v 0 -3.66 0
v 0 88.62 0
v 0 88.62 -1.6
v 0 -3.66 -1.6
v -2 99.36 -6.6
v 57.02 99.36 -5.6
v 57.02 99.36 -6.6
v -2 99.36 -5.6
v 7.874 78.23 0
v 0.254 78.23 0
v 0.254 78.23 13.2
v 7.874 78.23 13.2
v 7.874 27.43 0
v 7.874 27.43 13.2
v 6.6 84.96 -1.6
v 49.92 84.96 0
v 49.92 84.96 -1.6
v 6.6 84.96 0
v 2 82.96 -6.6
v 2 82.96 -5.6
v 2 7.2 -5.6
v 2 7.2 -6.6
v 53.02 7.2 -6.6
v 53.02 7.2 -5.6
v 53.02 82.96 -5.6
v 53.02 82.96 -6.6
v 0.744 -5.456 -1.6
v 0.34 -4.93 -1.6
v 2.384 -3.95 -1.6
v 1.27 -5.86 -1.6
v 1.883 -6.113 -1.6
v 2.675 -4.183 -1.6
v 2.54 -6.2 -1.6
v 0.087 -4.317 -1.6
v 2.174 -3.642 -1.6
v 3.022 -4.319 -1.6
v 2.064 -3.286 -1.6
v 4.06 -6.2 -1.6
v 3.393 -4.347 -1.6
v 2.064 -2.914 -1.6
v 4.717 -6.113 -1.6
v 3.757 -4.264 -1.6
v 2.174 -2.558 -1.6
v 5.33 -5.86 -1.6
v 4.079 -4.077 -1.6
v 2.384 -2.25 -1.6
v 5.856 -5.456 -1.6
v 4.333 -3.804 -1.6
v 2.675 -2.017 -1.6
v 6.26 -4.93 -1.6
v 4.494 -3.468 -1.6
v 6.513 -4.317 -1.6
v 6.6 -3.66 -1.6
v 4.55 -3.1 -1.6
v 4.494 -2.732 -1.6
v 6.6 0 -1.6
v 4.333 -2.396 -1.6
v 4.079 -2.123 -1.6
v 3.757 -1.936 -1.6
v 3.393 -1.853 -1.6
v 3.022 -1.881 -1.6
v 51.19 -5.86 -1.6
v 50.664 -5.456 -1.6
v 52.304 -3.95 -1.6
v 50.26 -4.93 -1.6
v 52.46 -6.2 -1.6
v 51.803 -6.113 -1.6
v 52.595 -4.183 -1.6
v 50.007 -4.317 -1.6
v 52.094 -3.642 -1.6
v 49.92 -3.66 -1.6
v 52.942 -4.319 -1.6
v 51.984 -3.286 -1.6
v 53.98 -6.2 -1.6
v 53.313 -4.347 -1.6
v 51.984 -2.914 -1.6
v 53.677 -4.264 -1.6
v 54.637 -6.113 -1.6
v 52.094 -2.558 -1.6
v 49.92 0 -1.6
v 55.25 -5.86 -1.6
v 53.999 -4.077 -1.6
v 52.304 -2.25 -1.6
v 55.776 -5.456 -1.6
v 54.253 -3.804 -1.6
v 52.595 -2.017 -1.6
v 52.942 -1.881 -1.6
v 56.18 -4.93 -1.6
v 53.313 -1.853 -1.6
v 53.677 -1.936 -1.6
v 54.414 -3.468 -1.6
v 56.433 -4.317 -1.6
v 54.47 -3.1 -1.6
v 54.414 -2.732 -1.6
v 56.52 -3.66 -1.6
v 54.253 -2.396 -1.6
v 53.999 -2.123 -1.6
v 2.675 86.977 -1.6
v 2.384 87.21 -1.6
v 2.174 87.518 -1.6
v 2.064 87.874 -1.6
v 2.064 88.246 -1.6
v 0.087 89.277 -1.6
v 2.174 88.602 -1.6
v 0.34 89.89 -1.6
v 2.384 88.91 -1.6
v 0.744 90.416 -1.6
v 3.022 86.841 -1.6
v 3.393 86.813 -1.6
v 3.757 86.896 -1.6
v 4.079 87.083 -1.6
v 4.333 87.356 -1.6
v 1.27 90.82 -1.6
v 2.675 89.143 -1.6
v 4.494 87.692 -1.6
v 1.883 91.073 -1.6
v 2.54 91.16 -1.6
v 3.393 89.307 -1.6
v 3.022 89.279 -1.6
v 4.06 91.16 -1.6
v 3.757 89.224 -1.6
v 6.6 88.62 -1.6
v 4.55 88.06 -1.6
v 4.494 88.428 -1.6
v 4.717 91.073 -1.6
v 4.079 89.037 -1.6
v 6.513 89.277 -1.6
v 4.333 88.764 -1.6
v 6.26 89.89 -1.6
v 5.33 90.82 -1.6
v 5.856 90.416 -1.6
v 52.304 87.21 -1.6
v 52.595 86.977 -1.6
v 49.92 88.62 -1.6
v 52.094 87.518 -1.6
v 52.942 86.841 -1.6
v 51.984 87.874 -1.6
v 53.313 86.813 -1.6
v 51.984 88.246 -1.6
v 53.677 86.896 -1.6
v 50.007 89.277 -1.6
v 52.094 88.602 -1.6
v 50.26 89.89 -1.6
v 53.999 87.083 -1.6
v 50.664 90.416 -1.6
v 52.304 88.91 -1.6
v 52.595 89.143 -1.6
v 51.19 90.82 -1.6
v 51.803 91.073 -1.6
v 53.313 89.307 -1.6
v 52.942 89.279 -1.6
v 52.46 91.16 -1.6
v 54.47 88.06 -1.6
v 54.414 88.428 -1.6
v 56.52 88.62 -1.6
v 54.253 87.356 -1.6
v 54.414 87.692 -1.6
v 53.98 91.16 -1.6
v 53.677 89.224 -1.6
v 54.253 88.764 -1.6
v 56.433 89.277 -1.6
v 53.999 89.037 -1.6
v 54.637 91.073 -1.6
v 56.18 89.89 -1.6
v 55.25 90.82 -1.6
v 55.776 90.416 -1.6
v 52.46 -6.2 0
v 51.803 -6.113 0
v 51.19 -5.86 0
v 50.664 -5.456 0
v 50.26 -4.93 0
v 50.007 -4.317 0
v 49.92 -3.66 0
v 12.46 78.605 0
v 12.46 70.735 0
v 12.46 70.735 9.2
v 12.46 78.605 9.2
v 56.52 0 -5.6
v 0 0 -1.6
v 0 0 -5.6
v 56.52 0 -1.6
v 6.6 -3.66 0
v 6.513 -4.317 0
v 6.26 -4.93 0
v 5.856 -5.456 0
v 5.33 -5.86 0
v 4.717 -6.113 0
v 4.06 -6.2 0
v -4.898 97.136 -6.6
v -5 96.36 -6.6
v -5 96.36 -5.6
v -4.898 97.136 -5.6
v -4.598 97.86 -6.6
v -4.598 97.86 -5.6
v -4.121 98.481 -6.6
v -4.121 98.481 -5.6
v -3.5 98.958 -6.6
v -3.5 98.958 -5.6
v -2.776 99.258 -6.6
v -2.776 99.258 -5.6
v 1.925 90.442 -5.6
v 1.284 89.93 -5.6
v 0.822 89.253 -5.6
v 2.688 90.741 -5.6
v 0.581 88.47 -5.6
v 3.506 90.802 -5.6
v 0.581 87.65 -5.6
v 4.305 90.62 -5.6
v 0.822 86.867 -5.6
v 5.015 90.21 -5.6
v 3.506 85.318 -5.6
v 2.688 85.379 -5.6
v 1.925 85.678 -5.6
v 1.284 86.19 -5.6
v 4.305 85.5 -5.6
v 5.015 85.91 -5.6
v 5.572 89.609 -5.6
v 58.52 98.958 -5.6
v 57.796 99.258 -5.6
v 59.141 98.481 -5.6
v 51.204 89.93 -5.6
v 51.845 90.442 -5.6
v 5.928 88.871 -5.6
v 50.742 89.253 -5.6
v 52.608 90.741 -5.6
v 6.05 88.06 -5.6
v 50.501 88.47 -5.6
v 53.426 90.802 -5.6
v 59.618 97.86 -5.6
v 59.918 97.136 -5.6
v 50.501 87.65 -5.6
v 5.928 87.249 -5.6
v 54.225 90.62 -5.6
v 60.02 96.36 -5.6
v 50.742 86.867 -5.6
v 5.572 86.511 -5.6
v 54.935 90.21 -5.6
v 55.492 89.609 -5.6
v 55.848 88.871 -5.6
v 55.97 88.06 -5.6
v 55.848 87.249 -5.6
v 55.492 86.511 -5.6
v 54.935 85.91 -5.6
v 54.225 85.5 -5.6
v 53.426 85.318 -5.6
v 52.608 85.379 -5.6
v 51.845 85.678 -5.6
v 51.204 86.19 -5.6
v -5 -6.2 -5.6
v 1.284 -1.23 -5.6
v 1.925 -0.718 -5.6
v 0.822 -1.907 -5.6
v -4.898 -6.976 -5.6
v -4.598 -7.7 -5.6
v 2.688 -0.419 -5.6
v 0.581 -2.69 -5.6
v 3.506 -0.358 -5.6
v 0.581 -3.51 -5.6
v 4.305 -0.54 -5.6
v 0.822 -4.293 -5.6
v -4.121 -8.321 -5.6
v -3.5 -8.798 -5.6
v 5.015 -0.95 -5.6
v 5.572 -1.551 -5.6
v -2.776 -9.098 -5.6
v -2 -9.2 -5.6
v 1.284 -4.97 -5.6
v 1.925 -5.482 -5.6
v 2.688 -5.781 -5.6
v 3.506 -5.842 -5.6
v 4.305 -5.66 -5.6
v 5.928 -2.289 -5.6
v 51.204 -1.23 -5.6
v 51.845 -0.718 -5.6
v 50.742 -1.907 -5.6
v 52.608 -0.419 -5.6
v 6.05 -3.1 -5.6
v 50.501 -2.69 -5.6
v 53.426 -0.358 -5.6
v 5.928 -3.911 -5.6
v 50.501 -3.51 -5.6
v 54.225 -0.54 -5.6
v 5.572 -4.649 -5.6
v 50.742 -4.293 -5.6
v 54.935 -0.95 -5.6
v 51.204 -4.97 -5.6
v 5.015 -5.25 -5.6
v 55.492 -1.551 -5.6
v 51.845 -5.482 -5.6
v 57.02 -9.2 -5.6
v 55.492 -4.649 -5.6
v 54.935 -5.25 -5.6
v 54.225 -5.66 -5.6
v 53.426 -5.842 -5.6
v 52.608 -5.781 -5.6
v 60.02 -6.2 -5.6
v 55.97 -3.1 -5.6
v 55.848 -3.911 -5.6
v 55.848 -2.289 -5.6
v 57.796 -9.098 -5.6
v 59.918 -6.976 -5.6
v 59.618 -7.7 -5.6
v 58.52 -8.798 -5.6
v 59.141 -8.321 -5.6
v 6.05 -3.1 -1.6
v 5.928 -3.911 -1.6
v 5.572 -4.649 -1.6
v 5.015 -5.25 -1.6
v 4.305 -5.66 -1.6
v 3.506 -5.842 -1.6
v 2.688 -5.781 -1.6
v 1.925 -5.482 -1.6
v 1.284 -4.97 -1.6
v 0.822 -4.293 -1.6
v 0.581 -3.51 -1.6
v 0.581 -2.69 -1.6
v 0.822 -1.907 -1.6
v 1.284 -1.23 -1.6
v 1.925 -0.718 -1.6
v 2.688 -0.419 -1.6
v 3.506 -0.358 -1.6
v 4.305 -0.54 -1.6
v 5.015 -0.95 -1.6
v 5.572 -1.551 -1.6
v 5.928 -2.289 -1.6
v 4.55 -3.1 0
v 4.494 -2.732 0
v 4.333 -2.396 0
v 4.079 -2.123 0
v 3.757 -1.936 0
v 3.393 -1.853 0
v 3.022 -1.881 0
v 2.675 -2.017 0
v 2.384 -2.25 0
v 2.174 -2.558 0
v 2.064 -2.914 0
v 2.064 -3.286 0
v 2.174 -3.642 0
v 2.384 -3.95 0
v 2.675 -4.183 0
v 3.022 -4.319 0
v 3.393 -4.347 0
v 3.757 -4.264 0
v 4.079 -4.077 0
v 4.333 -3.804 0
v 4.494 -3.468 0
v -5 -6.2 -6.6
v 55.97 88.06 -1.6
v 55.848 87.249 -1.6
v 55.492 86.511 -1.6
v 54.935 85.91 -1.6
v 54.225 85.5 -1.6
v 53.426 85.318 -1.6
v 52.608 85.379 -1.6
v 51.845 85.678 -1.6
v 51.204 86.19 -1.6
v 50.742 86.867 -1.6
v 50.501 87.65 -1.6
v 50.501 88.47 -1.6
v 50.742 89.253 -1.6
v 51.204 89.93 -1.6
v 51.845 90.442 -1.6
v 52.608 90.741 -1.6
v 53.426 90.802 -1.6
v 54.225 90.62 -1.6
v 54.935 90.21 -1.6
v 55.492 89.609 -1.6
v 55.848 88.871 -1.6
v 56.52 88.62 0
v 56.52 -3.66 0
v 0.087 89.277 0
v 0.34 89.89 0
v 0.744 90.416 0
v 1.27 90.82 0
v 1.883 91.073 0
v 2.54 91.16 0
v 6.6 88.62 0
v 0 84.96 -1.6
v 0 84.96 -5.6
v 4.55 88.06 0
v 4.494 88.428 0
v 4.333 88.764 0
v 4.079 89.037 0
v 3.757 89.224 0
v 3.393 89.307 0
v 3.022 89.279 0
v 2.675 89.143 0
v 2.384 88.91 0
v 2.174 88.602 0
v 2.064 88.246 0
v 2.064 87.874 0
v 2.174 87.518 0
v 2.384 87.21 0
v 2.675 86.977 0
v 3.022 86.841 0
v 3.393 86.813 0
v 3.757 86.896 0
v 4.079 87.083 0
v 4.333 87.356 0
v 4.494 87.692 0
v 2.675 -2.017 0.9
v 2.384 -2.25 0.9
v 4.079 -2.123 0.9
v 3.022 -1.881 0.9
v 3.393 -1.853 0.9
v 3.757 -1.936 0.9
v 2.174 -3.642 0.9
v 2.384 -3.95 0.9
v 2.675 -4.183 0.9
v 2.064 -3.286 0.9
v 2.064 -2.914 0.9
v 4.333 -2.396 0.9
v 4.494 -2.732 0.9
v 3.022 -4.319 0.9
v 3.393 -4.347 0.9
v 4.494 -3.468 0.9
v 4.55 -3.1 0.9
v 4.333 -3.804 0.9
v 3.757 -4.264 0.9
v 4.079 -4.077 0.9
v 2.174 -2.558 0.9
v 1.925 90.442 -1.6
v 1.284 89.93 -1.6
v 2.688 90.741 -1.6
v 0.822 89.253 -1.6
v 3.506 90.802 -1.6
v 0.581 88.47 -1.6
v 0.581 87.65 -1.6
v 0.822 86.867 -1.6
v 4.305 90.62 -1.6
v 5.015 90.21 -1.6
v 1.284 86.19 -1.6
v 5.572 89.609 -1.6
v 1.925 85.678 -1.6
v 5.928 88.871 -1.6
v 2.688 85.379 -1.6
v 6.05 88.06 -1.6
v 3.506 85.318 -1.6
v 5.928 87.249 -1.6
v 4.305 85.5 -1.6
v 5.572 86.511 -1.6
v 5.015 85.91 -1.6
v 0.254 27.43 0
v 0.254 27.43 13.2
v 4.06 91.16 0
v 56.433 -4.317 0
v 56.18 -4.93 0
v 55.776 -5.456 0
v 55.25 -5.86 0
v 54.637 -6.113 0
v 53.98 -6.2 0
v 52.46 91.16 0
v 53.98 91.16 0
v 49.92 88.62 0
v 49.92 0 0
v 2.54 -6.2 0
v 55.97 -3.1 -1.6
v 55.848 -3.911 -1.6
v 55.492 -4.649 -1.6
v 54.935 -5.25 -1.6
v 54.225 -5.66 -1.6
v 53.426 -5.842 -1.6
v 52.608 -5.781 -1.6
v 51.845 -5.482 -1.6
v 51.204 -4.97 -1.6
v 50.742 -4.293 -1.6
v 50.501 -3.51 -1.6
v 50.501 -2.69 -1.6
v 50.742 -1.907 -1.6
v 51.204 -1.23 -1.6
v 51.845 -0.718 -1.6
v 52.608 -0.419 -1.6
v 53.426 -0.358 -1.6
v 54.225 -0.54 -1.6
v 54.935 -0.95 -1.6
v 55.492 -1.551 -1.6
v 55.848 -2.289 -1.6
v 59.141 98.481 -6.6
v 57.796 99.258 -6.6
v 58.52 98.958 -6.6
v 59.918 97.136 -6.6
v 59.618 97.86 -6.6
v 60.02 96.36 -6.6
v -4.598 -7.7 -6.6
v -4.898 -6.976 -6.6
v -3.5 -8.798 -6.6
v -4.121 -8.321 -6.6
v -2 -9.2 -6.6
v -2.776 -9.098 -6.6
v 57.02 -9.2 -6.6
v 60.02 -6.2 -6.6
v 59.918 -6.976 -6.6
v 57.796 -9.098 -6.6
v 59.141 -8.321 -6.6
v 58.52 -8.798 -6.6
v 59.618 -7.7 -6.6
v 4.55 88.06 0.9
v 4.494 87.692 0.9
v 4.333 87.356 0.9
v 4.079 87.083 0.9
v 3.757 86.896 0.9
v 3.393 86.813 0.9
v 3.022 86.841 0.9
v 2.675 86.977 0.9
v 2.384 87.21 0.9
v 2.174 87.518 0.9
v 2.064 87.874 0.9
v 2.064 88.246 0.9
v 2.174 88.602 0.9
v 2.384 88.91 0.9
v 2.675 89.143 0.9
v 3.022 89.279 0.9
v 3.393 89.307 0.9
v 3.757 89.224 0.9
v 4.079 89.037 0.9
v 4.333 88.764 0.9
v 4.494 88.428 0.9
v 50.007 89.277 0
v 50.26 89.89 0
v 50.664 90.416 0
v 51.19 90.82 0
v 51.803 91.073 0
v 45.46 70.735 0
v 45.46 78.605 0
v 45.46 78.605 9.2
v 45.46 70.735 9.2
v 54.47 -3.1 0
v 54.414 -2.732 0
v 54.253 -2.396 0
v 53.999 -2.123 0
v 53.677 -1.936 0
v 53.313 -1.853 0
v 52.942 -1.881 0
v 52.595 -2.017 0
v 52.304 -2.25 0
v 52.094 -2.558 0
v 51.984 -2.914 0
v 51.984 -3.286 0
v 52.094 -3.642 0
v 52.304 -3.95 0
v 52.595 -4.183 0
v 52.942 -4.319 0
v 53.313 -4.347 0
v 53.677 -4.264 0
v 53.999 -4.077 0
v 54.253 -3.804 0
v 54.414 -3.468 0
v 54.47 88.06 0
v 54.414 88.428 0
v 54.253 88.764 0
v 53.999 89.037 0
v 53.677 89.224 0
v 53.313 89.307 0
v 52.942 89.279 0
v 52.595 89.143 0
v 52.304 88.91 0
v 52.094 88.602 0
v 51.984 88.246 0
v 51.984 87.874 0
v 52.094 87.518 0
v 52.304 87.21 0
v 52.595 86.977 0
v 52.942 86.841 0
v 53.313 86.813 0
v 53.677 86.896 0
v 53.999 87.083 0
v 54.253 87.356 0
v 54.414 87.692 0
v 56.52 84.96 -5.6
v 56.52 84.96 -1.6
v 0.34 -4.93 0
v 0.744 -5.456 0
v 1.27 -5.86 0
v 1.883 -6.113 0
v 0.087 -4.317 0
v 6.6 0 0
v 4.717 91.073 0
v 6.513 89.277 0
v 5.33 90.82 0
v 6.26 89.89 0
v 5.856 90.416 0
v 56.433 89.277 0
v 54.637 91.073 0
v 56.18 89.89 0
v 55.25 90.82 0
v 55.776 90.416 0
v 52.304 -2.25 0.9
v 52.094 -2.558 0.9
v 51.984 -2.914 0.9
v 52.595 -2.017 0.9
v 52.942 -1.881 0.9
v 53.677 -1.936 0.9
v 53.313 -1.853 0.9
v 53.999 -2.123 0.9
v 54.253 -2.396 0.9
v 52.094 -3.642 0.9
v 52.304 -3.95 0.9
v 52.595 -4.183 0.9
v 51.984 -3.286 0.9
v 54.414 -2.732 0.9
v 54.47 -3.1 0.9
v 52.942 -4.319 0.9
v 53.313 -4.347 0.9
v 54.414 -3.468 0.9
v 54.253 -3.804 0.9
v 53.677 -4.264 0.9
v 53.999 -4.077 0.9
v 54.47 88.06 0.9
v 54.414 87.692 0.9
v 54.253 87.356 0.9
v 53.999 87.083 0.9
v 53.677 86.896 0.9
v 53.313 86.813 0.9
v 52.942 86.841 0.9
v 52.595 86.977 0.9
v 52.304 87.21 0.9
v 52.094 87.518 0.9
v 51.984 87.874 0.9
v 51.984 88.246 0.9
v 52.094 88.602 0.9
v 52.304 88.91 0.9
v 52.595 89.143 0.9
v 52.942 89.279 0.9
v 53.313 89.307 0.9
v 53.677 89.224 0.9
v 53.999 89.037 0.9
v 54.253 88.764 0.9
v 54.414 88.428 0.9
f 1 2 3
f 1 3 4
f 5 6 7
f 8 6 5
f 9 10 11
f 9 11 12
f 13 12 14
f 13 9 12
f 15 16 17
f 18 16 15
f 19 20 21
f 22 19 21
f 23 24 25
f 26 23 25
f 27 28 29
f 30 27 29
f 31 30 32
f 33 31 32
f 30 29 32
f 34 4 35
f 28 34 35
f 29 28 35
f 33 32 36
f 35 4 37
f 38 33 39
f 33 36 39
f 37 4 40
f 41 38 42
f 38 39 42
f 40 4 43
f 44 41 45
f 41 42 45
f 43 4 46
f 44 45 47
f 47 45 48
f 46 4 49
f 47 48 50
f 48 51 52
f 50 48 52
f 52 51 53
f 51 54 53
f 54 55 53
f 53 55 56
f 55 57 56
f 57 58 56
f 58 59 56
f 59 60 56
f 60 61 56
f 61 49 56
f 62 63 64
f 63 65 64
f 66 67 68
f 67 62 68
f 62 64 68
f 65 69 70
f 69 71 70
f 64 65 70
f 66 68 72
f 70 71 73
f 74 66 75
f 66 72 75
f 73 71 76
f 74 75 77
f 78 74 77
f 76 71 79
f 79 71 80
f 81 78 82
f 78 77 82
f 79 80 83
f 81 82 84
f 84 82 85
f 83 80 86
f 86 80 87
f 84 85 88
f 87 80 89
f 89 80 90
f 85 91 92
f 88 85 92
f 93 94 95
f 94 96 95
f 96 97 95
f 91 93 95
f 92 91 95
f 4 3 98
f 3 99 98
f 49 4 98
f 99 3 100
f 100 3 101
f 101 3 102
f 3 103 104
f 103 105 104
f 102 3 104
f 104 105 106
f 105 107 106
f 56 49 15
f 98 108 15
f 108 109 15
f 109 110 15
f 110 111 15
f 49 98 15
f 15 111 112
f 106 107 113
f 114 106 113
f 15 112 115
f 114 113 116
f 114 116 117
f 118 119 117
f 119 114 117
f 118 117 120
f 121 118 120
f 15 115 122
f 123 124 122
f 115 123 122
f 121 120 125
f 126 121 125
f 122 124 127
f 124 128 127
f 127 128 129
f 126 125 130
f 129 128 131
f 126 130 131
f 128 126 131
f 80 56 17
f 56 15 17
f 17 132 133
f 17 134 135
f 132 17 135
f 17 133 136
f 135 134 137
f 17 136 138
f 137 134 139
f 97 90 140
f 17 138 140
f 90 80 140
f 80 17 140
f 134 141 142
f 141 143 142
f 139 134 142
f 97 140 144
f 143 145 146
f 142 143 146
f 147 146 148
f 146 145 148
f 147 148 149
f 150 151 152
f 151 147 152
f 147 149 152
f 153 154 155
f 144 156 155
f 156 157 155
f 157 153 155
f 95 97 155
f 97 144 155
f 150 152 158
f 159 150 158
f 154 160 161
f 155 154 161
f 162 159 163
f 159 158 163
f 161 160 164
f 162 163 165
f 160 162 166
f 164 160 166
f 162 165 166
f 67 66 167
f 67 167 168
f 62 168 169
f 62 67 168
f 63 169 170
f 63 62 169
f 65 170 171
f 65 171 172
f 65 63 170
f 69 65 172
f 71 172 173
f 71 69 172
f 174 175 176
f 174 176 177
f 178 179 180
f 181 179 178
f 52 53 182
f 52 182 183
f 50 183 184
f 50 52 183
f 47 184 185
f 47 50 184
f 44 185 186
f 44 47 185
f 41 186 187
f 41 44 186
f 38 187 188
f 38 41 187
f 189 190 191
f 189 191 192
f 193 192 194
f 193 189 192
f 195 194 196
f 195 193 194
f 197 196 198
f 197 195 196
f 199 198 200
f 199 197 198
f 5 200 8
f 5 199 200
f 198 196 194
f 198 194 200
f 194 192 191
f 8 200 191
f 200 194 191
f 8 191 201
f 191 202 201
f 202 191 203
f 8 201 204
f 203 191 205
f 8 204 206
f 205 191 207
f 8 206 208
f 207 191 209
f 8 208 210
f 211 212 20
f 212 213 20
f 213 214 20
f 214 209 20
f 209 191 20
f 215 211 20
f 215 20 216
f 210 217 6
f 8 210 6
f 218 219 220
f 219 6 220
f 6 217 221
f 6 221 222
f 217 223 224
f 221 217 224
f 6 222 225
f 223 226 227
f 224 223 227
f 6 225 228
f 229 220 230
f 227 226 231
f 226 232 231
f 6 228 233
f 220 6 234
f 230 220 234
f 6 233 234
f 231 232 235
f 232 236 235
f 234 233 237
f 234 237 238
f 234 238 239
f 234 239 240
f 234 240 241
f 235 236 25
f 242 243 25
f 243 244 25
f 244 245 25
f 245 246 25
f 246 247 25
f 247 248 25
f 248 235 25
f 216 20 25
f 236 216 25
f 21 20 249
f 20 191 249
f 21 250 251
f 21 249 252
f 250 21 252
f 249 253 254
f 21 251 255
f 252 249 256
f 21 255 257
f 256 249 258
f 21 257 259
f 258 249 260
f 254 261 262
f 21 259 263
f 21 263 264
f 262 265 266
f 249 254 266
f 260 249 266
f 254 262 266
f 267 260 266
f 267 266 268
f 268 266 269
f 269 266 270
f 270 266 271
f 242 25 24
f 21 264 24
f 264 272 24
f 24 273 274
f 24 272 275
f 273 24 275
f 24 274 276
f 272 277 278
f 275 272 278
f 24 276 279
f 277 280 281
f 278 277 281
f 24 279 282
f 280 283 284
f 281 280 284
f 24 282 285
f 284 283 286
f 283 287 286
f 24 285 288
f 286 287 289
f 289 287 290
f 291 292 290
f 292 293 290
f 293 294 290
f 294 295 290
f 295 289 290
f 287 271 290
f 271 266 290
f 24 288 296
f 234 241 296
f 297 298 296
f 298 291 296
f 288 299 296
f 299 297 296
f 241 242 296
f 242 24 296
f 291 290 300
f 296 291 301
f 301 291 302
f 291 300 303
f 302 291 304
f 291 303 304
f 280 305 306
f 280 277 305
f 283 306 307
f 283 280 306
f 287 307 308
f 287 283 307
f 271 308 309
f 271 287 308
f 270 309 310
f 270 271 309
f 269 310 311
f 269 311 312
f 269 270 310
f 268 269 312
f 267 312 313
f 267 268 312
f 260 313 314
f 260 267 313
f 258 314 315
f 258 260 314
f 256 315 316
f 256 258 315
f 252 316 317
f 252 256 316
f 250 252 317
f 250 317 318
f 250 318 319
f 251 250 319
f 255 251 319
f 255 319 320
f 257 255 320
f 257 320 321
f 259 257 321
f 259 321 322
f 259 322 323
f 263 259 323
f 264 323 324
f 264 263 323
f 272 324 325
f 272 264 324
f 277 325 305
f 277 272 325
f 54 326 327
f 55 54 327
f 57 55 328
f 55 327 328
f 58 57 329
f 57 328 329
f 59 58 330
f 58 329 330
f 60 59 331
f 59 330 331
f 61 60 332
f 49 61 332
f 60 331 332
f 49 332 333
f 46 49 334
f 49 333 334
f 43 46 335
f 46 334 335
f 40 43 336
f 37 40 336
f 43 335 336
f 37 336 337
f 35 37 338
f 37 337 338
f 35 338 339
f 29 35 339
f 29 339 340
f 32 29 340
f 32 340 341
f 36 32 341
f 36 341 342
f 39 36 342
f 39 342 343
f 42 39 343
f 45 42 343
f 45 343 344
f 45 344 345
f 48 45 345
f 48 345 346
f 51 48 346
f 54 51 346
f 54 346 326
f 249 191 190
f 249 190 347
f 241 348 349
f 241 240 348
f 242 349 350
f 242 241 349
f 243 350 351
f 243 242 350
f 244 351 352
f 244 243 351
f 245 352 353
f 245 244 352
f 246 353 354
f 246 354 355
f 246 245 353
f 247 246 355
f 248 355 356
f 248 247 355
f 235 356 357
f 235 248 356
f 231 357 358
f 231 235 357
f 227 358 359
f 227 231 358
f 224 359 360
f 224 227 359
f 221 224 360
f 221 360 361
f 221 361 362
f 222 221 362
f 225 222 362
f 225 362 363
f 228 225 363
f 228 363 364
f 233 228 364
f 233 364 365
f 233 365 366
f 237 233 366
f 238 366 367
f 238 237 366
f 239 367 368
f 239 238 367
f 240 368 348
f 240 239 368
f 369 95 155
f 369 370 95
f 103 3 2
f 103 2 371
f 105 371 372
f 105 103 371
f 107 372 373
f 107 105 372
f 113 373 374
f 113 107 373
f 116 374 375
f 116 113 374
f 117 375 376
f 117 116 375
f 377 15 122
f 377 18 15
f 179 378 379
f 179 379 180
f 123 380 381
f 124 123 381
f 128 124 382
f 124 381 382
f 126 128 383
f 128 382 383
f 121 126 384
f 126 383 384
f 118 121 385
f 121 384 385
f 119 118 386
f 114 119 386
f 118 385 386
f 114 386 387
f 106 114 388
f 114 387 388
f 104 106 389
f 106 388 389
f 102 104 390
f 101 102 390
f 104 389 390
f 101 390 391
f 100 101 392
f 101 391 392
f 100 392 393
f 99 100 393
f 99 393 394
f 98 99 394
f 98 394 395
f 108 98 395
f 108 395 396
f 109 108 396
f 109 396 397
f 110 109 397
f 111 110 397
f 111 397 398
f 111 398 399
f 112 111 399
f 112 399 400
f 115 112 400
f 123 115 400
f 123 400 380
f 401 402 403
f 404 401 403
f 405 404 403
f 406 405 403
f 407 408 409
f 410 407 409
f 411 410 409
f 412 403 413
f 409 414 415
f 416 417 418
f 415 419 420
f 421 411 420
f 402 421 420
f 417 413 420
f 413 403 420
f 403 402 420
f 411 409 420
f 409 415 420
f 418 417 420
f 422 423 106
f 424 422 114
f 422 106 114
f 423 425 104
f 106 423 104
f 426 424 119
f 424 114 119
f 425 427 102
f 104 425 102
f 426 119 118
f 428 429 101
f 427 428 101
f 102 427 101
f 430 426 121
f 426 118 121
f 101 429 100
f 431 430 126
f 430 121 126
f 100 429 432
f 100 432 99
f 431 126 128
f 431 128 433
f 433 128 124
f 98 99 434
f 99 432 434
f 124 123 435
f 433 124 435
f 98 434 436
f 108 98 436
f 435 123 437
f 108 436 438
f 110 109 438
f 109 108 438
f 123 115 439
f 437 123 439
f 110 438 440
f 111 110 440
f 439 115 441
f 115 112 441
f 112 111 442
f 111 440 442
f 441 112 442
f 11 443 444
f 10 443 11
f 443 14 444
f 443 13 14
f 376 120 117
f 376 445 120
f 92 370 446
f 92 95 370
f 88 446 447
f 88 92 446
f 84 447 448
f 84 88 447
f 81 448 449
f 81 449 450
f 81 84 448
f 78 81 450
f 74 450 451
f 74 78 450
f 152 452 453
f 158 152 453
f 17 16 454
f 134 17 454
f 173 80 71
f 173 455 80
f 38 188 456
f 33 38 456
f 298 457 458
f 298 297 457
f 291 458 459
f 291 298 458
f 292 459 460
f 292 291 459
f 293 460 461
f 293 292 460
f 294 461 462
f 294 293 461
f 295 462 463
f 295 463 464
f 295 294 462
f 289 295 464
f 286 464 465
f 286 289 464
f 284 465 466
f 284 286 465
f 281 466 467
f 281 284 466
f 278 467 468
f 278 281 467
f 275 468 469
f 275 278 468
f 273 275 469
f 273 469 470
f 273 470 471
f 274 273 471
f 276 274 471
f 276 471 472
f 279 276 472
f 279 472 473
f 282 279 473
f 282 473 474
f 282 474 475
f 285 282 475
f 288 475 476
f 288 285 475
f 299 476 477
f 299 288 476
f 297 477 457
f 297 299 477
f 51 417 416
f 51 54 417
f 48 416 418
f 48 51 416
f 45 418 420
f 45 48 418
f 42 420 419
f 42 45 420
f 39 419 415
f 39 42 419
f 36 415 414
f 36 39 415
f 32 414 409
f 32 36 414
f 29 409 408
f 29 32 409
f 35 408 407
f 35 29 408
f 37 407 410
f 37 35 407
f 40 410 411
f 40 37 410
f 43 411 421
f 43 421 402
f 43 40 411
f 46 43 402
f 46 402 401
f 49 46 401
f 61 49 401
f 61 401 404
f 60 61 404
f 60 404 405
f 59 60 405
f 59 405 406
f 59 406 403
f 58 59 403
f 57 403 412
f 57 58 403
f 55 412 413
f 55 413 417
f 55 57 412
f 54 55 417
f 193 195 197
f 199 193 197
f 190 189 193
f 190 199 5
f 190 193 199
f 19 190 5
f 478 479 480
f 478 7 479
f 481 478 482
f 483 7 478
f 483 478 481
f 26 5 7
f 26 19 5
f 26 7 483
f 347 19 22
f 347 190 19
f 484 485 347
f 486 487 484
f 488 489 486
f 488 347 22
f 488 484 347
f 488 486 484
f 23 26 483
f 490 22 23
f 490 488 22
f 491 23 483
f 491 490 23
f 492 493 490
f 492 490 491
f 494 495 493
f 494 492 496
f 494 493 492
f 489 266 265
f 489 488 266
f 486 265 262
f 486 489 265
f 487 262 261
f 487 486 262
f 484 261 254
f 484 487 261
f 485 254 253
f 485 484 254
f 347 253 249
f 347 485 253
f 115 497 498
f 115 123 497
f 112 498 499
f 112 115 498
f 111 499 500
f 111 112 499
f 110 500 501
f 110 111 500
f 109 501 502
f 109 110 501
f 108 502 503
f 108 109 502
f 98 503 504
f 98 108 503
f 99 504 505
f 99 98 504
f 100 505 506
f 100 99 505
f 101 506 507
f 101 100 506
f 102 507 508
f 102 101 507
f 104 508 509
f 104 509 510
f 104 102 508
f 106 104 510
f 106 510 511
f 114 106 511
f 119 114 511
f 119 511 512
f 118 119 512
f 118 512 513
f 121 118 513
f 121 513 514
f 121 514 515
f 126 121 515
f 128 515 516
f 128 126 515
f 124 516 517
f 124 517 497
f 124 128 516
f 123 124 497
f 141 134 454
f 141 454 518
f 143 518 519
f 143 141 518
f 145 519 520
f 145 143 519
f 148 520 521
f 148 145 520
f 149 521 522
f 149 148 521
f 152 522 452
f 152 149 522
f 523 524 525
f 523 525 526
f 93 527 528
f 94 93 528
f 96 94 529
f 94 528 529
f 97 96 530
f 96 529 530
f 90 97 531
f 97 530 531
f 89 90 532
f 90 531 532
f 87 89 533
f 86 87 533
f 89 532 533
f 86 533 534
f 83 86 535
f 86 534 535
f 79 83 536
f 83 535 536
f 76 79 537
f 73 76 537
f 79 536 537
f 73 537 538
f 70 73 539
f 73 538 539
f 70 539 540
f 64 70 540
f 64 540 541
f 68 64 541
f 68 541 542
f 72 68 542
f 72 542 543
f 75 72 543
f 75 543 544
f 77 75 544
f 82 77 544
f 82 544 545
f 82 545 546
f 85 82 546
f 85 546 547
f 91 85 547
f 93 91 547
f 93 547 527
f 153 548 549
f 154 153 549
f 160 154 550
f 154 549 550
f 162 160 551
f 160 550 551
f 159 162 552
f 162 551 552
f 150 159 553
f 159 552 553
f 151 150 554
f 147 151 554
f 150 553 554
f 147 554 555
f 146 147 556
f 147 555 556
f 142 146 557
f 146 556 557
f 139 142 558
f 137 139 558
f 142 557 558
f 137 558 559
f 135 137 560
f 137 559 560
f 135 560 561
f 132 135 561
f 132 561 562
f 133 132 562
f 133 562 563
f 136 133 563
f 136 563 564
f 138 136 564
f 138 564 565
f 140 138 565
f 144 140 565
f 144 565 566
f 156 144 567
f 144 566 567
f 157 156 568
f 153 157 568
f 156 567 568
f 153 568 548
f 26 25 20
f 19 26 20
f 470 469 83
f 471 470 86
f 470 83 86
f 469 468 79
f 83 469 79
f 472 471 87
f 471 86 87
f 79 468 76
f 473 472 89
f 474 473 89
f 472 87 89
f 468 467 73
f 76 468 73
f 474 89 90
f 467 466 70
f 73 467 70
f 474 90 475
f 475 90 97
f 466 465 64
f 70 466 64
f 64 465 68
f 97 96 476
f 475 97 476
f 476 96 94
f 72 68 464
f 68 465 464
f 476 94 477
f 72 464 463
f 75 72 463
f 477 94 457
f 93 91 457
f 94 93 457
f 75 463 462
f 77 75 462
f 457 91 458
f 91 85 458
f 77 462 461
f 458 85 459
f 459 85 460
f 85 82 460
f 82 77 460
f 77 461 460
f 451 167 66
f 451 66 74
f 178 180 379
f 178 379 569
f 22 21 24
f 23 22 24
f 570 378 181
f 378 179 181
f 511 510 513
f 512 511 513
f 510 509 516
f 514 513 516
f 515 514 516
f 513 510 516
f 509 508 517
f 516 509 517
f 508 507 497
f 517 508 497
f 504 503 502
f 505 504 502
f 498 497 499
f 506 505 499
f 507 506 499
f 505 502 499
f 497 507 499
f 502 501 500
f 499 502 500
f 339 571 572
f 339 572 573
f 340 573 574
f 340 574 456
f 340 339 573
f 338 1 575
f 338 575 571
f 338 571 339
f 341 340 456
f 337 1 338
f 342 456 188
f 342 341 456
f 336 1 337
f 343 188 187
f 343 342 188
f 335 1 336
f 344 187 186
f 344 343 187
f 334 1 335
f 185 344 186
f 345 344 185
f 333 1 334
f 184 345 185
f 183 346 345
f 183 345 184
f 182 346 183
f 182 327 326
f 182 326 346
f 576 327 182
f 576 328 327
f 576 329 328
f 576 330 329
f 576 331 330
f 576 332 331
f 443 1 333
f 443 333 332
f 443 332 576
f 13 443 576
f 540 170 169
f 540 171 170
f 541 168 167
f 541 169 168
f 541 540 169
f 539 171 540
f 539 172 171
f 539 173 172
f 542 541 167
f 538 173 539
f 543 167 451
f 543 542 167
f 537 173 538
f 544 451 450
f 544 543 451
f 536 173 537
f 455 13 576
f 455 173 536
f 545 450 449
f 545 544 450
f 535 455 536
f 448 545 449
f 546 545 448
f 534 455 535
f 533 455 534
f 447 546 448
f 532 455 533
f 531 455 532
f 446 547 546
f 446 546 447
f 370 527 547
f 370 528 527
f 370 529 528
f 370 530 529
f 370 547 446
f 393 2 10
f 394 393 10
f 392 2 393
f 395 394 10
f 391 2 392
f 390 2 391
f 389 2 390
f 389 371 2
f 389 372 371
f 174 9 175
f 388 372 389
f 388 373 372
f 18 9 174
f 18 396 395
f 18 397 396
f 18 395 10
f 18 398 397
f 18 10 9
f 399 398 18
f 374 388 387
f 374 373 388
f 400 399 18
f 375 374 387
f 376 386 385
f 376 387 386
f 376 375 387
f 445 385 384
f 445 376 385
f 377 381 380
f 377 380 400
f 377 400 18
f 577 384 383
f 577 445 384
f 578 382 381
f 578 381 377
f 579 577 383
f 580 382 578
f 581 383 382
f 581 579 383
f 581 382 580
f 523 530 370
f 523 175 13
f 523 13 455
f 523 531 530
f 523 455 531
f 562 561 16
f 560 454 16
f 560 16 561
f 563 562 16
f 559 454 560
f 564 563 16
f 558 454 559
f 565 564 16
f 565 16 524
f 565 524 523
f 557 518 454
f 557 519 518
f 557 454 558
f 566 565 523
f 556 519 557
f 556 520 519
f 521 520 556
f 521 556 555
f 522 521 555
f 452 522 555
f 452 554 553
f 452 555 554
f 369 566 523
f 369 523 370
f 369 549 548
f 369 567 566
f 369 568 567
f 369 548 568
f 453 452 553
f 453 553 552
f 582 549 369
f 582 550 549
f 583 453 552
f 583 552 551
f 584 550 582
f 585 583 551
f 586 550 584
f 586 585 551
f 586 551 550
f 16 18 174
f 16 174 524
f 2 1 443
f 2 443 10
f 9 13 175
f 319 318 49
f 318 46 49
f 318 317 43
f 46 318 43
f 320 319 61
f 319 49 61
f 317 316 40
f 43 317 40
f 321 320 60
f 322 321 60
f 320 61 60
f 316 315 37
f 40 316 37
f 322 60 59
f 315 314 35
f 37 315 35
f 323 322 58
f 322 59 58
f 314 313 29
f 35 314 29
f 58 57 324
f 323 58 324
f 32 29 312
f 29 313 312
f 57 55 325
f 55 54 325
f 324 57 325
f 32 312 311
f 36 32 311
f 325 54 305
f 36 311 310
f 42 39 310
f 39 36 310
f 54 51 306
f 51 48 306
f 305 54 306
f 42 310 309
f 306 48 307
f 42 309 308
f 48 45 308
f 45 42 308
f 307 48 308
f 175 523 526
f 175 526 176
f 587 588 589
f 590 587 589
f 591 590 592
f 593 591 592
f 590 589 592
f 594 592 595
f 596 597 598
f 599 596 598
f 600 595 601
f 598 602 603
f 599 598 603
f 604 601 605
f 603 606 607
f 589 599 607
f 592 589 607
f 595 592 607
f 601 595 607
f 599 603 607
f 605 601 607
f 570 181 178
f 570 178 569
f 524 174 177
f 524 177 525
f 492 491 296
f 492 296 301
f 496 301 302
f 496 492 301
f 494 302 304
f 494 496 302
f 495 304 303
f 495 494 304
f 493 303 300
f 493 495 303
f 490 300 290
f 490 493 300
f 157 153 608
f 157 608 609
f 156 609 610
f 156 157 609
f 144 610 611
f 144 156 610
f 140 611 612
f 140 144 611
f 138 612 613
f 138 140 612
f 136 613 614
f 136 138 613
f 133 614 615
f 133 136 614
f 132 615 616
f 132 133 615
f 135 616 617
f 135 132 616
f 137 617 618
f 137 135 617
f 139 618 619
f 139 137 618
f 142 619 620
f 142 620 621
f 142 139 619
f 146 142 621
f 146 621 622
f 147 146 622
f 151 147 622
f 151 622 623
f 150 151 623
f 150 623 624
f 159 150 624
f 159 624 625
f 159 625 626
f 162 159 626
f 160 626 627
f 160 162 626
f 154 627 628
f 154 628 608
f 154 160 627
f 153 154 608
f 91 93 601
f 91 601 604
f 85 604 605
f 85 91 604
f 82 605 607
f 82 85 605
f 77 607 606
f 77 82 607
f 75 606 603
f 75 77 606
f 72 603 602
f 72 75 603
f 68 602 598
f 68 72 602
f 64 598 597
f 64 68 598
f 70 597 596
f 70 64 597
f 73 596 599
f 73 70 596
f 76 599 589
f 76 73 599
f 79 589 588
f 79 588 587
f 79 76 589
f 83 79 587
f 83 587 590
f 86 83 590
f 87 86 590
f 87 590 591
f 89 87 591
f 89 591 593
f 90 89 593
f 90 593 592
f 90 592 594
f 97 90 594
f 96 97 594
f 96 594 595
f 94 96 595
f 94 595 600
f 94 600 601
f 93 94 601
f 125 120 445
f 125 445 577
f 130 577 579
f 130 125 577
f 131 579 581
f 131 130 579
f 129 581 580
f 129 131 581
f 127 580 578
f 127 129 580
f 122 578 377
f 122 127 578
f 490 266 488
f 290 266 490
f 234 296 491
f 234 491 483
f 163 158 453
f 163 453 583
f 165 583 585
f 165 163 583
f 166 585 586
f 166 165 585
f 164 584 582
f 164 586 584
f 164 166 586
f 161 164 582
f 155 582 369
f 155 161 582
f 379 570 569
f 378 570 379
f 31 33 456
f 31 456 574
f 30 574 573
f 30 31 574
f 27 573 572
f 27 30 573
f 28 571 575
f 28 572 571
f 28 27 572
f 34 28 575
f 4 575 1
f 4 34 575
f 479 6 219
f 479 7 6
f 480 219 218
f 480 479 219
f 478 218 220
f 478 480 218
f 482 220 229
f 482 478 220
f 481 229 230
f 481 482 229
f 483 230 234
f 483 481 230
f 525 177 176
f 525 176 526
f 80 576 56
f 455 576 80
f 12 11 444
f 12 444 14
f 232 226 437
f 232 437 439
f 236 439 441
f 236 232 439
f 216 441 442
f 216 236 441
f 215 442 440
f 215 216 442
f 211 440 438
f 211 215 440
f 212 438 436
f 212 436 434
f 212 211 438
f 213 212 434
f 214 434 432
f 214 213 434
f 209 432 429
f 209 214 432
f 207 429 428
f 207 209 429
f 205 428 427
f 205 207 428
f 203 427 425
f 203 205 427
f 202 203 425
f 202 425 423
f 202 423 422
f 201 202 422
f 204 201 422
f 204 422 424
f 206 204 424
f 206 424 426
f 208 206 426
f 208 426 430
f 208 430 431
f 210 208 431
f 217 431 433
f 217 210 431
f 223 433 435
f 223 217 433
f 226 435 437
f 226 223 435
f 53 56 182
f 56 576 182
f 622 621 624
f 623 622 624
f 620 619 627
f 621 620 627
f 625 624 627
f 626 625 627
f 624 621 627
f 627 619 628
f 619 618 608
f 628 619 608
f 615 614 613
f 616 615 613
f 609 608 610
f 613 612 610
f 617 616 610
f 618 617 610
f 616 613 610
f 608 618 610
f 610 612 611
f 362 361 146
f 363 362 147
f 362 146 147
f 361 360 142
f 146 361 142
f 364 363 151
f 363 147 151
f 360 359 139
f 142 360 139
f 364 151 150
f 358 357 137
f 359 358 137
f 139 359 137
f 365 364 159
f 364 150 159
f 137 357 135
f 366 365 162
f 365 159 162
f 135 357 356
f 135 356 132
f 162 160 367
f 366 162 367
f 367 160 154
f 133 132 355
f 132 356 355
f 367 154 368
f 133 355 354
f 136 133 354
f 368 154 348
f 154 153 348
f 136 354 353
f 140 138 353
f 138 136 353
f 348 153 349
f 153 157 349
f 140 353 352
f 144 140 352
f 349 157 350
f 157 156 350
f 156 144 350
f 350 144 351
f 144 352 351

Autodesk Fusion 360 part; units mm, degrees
sketch "PCB" plane through (0, 0, 0) normal (0, 0, 1) x (1, 0, 0)
  line L0 (0, 0) -> (56.52, 0)
  line L1 (56.52, 0) -> (56.52, 84.96)
  line L2 (56.52, 84.96) -> (0, 84.96)
  line L3 (0, 84.96) -> (0, 0)
  line L4 (0, 84.96) -> (6.6, 84.96)
  line L5 (6.6, 84.96) -> (6.6, 91.16)
  line L6 (6.6, 91.16) -> (0, 91.16)
  line L7 (0, 91.16) -> (0, 84.96)
  line L8 (3.3, 91.16) -> (3.3, 84.96) construction
  line L9 (0, 88.06) -> (6.6, 88.06) construction
  circle A0 centre (3.3, 88.06) radius 1.25
  line L10 (28.26, 84.96) -> (28.26, 0) construction
  line L11 (0, 42.48) -> (56.52, 42.48) construction
  circle A1 centre (53.22, 88.06) radius 1.25
  line L12 (49.92, 91.16) -> (56.52, 91.16)
  line L13 (56.52, 91.16) -> (56.52, 84.96)
  line L14 (49.92, 84.96) -> (49.92, 91.16)
  line L15 (0, -6.2) -> (0, 0)
  line L16 (6.6, -6.2) -> (0, -6.2)
  circle A2 centre (3.3, -3.1) radius 1.25
  line L17 (6.6, 0) -> (6.6, -6.2)
  circle A3 centre (53.22, -3.1) radius 1.25
  line L18 (49.92, -6.2) -> (56.52, -6.2)
  line L19 (49.92, 0) -> (49.92, -6.2)
  line L20 (56.52, -6.2) -> (56.52, 0)
  dimension "d1" = 84.96
  dimension "d2" = 56.52
  dimension "d3" = 6.6
  dimension "d4" = 6.2
  dimension "d5" = 2.5
  dimension "d6" = 49.92
  dimension "d7" = 91.16
extrude "Extrude1" add sketch "PCB" against normal blind 1.6 makes body 1
fillet "Fillet1" radius 2.54 8 edges at (0, -6.2, -0.8) (6.6, -6.2, -0.8) (49.92, -6.2, -0.8) (56.52, -6.2, -0.8) (49.92, 91.16, -0.8) (56.52, 91.16, -0.8) (6.6, 91.16, -0.8) (0, 91.16, -0.8) on bodies 1
sketch "headers" plane through (0, 0, 0) normal (0, 0, 1) x (1, 0, 0)
  line L0 (0, 0) -> (56.52, 0)
  line L1 (56.52, 0) -> (56.52, 84.96)
  line L2 (56.52, 84.96) -> (0, 84.96)
  line L3 (0, 84.96) -> (0, 0)
  line L4 (45.46, 70.735) -> (12.46, 70.735)
  line L5 (12.46, 70.735) -> (12.46, 78.605)
  line L6 (12.46, 78.605) -> (45.46, 78.605)
  line L7 (45.46, 78.605) -> (45.46, 70.735)
  line L8 (45.46, 70.735) -> (12.46, 78.605) construction
  line L9 (12.46, 70.735) -> (45.46, 78.605) construction
  line L10 (0.254, 78.23) -> (7.874, 78.23)
  line L11 (7.874, 78.23) -> (7.874, 27.43)
  line L12 (7.874, 27.43) -> (0.254, 27.43)
  line L13 (0.254, 27.43) -> (0.254, 78.23)
  point P0 (28.96, 74.67)
  dimension "d11" = 84.96
  dimension "d12" = 56.52
  dimension "d13" = 33
  dimension "d14" = 7.87
  dimension "d15" = 28.96
  dimension "d16" = 10.29
  dimension "d17" = 7.62
  dimension "d18" = 50.8
  dimension "d19" = 6.73
  dimension "d20" = 0.254
extrude "Extrude2" add sketch "headers" along normal blind 9.2 contours L4 L5 L6 L7 bodies 1
extrude "Extrude3" add sketch "headers" along normal blind 13.2 contours L10 L11 L12 L13 bodies 1
sketch "screen cut" plane through (0, 0, -1.6) normal (0, 0, -1) x (1, 0, 0)
  line L0 (0, 0) -> (56.52, 0)
  line L1 (56.52, 0) -> (56.52, -84.96)
  line L2 (56.52, -84.96) -> (0, -84.96)
  line L3 (0, -84.96) -> (0, 0)
  line L4 (53.02, -82.96) -> (2, -82.96)
  line L5 (2, -82.96) -> (2, -7.2)
  line L6 (2, -7.2) -> (53.02, -7.2)
  line L7 (53.02, -7.2) -> (53.02, -82.96)
  dimension "d48" = 84.96
  dimension "d49" = 56.52
  dimension "d50" = 7.2
  dimension "d51" = 3.5
  dimension "d52" = 2
  dimension "d53" = 2
extrude "Extrude4" add sketch "screen cut" along normal blind 4 separate body contours L0 L1 L2 L3 | L4 L5 L6 L7 makes body 2
sketch "display mount" plane through (0, 0, -5.6) normal (0, 0, -1) x (1, 0, 0)
  line L0 (0, -84.96) -> (56.52, -84.96) construction
  line L1 (56.52, -84.96) -> (56.52, 0) construction
  line L2 (56.52, 0) -> (0, 0) construction
  line L3 (0, 0) -> (0, -84.96) construction
  line L4 (-5, 9.2) -> (60.02, 9.2)
  line L5 (60.02, 9.2) -> (60.02, -99.36)
  line L6 (60.02, -99.36) -> (-5, -99.36)
  line L7 (-5, -99.36) -> (-5, 9.2)
  circle A0 centre (3.3, -88.06) radius 1.25
  circle A1 centre (53.22, -88.06) radius 1.25
  circle A2 centre (53.22, 3.1) radius 1.25
  circle A3 centre (3.3, 3.1) radius 1.25
  circle A4 centre (3.3, -88.06) radius 2.75
  circle A5 centre (53.22, 3.1) radius 2.75
  circle A6 centre (3.3, 3.1) radius 2.75
  circle A7 centre (53.22, -88.06) radius 2.75
  line L8 (56.52, 3.66) -> (56.52, -88.62)
  line L9 (0, -88.62) -> (0, 3.66)
  line L10 (4.06, -91.16) -> (2.54, -91.16)
  line L11 (4.06, 6.2) -> (2.54, 6.2)
  dimension "d54" = 5.5
  dimension "d55" = 5.5
  dimension "d56" = 5.5
  dimension "d57" = 5.5
  dimension "d64" = 3.5
  dimension "d65" = 5
  dimension "d66" = 8.2
  dimension "d67" = 3
extrude "Extrude9" add sketch "display mount" along normal blind 1 separate body contours L4 L5 L6 L7 | A0 | A1 | A2 | A3 | A4 | A5 | A6 | A7 makes body 3
extrude "Extrude10" cut sketch "screen cut" along normal up to surface (5 mm away) contours L4 L5 L6 L7 bodies 3
extrude "Extrude11" add sketch "display mount" against normal up to surface (4 mm away) contours A0 | A1 | A2 | A3 | A4 | A5 | A6 | A7 bodies 3
extrude "Extrude12" add sketch "display mount" against normal blind 6.5 contours A0 | A1 | A2 | A3 bodies 3
fillet "Fillet3" radius 3 4 edges at (60.02, -9.2, -6.1) (-5, -9.2, -6.1) (-5, 99.36, -6.1) (60.02, 99.36, -6.1) on bodies 3
